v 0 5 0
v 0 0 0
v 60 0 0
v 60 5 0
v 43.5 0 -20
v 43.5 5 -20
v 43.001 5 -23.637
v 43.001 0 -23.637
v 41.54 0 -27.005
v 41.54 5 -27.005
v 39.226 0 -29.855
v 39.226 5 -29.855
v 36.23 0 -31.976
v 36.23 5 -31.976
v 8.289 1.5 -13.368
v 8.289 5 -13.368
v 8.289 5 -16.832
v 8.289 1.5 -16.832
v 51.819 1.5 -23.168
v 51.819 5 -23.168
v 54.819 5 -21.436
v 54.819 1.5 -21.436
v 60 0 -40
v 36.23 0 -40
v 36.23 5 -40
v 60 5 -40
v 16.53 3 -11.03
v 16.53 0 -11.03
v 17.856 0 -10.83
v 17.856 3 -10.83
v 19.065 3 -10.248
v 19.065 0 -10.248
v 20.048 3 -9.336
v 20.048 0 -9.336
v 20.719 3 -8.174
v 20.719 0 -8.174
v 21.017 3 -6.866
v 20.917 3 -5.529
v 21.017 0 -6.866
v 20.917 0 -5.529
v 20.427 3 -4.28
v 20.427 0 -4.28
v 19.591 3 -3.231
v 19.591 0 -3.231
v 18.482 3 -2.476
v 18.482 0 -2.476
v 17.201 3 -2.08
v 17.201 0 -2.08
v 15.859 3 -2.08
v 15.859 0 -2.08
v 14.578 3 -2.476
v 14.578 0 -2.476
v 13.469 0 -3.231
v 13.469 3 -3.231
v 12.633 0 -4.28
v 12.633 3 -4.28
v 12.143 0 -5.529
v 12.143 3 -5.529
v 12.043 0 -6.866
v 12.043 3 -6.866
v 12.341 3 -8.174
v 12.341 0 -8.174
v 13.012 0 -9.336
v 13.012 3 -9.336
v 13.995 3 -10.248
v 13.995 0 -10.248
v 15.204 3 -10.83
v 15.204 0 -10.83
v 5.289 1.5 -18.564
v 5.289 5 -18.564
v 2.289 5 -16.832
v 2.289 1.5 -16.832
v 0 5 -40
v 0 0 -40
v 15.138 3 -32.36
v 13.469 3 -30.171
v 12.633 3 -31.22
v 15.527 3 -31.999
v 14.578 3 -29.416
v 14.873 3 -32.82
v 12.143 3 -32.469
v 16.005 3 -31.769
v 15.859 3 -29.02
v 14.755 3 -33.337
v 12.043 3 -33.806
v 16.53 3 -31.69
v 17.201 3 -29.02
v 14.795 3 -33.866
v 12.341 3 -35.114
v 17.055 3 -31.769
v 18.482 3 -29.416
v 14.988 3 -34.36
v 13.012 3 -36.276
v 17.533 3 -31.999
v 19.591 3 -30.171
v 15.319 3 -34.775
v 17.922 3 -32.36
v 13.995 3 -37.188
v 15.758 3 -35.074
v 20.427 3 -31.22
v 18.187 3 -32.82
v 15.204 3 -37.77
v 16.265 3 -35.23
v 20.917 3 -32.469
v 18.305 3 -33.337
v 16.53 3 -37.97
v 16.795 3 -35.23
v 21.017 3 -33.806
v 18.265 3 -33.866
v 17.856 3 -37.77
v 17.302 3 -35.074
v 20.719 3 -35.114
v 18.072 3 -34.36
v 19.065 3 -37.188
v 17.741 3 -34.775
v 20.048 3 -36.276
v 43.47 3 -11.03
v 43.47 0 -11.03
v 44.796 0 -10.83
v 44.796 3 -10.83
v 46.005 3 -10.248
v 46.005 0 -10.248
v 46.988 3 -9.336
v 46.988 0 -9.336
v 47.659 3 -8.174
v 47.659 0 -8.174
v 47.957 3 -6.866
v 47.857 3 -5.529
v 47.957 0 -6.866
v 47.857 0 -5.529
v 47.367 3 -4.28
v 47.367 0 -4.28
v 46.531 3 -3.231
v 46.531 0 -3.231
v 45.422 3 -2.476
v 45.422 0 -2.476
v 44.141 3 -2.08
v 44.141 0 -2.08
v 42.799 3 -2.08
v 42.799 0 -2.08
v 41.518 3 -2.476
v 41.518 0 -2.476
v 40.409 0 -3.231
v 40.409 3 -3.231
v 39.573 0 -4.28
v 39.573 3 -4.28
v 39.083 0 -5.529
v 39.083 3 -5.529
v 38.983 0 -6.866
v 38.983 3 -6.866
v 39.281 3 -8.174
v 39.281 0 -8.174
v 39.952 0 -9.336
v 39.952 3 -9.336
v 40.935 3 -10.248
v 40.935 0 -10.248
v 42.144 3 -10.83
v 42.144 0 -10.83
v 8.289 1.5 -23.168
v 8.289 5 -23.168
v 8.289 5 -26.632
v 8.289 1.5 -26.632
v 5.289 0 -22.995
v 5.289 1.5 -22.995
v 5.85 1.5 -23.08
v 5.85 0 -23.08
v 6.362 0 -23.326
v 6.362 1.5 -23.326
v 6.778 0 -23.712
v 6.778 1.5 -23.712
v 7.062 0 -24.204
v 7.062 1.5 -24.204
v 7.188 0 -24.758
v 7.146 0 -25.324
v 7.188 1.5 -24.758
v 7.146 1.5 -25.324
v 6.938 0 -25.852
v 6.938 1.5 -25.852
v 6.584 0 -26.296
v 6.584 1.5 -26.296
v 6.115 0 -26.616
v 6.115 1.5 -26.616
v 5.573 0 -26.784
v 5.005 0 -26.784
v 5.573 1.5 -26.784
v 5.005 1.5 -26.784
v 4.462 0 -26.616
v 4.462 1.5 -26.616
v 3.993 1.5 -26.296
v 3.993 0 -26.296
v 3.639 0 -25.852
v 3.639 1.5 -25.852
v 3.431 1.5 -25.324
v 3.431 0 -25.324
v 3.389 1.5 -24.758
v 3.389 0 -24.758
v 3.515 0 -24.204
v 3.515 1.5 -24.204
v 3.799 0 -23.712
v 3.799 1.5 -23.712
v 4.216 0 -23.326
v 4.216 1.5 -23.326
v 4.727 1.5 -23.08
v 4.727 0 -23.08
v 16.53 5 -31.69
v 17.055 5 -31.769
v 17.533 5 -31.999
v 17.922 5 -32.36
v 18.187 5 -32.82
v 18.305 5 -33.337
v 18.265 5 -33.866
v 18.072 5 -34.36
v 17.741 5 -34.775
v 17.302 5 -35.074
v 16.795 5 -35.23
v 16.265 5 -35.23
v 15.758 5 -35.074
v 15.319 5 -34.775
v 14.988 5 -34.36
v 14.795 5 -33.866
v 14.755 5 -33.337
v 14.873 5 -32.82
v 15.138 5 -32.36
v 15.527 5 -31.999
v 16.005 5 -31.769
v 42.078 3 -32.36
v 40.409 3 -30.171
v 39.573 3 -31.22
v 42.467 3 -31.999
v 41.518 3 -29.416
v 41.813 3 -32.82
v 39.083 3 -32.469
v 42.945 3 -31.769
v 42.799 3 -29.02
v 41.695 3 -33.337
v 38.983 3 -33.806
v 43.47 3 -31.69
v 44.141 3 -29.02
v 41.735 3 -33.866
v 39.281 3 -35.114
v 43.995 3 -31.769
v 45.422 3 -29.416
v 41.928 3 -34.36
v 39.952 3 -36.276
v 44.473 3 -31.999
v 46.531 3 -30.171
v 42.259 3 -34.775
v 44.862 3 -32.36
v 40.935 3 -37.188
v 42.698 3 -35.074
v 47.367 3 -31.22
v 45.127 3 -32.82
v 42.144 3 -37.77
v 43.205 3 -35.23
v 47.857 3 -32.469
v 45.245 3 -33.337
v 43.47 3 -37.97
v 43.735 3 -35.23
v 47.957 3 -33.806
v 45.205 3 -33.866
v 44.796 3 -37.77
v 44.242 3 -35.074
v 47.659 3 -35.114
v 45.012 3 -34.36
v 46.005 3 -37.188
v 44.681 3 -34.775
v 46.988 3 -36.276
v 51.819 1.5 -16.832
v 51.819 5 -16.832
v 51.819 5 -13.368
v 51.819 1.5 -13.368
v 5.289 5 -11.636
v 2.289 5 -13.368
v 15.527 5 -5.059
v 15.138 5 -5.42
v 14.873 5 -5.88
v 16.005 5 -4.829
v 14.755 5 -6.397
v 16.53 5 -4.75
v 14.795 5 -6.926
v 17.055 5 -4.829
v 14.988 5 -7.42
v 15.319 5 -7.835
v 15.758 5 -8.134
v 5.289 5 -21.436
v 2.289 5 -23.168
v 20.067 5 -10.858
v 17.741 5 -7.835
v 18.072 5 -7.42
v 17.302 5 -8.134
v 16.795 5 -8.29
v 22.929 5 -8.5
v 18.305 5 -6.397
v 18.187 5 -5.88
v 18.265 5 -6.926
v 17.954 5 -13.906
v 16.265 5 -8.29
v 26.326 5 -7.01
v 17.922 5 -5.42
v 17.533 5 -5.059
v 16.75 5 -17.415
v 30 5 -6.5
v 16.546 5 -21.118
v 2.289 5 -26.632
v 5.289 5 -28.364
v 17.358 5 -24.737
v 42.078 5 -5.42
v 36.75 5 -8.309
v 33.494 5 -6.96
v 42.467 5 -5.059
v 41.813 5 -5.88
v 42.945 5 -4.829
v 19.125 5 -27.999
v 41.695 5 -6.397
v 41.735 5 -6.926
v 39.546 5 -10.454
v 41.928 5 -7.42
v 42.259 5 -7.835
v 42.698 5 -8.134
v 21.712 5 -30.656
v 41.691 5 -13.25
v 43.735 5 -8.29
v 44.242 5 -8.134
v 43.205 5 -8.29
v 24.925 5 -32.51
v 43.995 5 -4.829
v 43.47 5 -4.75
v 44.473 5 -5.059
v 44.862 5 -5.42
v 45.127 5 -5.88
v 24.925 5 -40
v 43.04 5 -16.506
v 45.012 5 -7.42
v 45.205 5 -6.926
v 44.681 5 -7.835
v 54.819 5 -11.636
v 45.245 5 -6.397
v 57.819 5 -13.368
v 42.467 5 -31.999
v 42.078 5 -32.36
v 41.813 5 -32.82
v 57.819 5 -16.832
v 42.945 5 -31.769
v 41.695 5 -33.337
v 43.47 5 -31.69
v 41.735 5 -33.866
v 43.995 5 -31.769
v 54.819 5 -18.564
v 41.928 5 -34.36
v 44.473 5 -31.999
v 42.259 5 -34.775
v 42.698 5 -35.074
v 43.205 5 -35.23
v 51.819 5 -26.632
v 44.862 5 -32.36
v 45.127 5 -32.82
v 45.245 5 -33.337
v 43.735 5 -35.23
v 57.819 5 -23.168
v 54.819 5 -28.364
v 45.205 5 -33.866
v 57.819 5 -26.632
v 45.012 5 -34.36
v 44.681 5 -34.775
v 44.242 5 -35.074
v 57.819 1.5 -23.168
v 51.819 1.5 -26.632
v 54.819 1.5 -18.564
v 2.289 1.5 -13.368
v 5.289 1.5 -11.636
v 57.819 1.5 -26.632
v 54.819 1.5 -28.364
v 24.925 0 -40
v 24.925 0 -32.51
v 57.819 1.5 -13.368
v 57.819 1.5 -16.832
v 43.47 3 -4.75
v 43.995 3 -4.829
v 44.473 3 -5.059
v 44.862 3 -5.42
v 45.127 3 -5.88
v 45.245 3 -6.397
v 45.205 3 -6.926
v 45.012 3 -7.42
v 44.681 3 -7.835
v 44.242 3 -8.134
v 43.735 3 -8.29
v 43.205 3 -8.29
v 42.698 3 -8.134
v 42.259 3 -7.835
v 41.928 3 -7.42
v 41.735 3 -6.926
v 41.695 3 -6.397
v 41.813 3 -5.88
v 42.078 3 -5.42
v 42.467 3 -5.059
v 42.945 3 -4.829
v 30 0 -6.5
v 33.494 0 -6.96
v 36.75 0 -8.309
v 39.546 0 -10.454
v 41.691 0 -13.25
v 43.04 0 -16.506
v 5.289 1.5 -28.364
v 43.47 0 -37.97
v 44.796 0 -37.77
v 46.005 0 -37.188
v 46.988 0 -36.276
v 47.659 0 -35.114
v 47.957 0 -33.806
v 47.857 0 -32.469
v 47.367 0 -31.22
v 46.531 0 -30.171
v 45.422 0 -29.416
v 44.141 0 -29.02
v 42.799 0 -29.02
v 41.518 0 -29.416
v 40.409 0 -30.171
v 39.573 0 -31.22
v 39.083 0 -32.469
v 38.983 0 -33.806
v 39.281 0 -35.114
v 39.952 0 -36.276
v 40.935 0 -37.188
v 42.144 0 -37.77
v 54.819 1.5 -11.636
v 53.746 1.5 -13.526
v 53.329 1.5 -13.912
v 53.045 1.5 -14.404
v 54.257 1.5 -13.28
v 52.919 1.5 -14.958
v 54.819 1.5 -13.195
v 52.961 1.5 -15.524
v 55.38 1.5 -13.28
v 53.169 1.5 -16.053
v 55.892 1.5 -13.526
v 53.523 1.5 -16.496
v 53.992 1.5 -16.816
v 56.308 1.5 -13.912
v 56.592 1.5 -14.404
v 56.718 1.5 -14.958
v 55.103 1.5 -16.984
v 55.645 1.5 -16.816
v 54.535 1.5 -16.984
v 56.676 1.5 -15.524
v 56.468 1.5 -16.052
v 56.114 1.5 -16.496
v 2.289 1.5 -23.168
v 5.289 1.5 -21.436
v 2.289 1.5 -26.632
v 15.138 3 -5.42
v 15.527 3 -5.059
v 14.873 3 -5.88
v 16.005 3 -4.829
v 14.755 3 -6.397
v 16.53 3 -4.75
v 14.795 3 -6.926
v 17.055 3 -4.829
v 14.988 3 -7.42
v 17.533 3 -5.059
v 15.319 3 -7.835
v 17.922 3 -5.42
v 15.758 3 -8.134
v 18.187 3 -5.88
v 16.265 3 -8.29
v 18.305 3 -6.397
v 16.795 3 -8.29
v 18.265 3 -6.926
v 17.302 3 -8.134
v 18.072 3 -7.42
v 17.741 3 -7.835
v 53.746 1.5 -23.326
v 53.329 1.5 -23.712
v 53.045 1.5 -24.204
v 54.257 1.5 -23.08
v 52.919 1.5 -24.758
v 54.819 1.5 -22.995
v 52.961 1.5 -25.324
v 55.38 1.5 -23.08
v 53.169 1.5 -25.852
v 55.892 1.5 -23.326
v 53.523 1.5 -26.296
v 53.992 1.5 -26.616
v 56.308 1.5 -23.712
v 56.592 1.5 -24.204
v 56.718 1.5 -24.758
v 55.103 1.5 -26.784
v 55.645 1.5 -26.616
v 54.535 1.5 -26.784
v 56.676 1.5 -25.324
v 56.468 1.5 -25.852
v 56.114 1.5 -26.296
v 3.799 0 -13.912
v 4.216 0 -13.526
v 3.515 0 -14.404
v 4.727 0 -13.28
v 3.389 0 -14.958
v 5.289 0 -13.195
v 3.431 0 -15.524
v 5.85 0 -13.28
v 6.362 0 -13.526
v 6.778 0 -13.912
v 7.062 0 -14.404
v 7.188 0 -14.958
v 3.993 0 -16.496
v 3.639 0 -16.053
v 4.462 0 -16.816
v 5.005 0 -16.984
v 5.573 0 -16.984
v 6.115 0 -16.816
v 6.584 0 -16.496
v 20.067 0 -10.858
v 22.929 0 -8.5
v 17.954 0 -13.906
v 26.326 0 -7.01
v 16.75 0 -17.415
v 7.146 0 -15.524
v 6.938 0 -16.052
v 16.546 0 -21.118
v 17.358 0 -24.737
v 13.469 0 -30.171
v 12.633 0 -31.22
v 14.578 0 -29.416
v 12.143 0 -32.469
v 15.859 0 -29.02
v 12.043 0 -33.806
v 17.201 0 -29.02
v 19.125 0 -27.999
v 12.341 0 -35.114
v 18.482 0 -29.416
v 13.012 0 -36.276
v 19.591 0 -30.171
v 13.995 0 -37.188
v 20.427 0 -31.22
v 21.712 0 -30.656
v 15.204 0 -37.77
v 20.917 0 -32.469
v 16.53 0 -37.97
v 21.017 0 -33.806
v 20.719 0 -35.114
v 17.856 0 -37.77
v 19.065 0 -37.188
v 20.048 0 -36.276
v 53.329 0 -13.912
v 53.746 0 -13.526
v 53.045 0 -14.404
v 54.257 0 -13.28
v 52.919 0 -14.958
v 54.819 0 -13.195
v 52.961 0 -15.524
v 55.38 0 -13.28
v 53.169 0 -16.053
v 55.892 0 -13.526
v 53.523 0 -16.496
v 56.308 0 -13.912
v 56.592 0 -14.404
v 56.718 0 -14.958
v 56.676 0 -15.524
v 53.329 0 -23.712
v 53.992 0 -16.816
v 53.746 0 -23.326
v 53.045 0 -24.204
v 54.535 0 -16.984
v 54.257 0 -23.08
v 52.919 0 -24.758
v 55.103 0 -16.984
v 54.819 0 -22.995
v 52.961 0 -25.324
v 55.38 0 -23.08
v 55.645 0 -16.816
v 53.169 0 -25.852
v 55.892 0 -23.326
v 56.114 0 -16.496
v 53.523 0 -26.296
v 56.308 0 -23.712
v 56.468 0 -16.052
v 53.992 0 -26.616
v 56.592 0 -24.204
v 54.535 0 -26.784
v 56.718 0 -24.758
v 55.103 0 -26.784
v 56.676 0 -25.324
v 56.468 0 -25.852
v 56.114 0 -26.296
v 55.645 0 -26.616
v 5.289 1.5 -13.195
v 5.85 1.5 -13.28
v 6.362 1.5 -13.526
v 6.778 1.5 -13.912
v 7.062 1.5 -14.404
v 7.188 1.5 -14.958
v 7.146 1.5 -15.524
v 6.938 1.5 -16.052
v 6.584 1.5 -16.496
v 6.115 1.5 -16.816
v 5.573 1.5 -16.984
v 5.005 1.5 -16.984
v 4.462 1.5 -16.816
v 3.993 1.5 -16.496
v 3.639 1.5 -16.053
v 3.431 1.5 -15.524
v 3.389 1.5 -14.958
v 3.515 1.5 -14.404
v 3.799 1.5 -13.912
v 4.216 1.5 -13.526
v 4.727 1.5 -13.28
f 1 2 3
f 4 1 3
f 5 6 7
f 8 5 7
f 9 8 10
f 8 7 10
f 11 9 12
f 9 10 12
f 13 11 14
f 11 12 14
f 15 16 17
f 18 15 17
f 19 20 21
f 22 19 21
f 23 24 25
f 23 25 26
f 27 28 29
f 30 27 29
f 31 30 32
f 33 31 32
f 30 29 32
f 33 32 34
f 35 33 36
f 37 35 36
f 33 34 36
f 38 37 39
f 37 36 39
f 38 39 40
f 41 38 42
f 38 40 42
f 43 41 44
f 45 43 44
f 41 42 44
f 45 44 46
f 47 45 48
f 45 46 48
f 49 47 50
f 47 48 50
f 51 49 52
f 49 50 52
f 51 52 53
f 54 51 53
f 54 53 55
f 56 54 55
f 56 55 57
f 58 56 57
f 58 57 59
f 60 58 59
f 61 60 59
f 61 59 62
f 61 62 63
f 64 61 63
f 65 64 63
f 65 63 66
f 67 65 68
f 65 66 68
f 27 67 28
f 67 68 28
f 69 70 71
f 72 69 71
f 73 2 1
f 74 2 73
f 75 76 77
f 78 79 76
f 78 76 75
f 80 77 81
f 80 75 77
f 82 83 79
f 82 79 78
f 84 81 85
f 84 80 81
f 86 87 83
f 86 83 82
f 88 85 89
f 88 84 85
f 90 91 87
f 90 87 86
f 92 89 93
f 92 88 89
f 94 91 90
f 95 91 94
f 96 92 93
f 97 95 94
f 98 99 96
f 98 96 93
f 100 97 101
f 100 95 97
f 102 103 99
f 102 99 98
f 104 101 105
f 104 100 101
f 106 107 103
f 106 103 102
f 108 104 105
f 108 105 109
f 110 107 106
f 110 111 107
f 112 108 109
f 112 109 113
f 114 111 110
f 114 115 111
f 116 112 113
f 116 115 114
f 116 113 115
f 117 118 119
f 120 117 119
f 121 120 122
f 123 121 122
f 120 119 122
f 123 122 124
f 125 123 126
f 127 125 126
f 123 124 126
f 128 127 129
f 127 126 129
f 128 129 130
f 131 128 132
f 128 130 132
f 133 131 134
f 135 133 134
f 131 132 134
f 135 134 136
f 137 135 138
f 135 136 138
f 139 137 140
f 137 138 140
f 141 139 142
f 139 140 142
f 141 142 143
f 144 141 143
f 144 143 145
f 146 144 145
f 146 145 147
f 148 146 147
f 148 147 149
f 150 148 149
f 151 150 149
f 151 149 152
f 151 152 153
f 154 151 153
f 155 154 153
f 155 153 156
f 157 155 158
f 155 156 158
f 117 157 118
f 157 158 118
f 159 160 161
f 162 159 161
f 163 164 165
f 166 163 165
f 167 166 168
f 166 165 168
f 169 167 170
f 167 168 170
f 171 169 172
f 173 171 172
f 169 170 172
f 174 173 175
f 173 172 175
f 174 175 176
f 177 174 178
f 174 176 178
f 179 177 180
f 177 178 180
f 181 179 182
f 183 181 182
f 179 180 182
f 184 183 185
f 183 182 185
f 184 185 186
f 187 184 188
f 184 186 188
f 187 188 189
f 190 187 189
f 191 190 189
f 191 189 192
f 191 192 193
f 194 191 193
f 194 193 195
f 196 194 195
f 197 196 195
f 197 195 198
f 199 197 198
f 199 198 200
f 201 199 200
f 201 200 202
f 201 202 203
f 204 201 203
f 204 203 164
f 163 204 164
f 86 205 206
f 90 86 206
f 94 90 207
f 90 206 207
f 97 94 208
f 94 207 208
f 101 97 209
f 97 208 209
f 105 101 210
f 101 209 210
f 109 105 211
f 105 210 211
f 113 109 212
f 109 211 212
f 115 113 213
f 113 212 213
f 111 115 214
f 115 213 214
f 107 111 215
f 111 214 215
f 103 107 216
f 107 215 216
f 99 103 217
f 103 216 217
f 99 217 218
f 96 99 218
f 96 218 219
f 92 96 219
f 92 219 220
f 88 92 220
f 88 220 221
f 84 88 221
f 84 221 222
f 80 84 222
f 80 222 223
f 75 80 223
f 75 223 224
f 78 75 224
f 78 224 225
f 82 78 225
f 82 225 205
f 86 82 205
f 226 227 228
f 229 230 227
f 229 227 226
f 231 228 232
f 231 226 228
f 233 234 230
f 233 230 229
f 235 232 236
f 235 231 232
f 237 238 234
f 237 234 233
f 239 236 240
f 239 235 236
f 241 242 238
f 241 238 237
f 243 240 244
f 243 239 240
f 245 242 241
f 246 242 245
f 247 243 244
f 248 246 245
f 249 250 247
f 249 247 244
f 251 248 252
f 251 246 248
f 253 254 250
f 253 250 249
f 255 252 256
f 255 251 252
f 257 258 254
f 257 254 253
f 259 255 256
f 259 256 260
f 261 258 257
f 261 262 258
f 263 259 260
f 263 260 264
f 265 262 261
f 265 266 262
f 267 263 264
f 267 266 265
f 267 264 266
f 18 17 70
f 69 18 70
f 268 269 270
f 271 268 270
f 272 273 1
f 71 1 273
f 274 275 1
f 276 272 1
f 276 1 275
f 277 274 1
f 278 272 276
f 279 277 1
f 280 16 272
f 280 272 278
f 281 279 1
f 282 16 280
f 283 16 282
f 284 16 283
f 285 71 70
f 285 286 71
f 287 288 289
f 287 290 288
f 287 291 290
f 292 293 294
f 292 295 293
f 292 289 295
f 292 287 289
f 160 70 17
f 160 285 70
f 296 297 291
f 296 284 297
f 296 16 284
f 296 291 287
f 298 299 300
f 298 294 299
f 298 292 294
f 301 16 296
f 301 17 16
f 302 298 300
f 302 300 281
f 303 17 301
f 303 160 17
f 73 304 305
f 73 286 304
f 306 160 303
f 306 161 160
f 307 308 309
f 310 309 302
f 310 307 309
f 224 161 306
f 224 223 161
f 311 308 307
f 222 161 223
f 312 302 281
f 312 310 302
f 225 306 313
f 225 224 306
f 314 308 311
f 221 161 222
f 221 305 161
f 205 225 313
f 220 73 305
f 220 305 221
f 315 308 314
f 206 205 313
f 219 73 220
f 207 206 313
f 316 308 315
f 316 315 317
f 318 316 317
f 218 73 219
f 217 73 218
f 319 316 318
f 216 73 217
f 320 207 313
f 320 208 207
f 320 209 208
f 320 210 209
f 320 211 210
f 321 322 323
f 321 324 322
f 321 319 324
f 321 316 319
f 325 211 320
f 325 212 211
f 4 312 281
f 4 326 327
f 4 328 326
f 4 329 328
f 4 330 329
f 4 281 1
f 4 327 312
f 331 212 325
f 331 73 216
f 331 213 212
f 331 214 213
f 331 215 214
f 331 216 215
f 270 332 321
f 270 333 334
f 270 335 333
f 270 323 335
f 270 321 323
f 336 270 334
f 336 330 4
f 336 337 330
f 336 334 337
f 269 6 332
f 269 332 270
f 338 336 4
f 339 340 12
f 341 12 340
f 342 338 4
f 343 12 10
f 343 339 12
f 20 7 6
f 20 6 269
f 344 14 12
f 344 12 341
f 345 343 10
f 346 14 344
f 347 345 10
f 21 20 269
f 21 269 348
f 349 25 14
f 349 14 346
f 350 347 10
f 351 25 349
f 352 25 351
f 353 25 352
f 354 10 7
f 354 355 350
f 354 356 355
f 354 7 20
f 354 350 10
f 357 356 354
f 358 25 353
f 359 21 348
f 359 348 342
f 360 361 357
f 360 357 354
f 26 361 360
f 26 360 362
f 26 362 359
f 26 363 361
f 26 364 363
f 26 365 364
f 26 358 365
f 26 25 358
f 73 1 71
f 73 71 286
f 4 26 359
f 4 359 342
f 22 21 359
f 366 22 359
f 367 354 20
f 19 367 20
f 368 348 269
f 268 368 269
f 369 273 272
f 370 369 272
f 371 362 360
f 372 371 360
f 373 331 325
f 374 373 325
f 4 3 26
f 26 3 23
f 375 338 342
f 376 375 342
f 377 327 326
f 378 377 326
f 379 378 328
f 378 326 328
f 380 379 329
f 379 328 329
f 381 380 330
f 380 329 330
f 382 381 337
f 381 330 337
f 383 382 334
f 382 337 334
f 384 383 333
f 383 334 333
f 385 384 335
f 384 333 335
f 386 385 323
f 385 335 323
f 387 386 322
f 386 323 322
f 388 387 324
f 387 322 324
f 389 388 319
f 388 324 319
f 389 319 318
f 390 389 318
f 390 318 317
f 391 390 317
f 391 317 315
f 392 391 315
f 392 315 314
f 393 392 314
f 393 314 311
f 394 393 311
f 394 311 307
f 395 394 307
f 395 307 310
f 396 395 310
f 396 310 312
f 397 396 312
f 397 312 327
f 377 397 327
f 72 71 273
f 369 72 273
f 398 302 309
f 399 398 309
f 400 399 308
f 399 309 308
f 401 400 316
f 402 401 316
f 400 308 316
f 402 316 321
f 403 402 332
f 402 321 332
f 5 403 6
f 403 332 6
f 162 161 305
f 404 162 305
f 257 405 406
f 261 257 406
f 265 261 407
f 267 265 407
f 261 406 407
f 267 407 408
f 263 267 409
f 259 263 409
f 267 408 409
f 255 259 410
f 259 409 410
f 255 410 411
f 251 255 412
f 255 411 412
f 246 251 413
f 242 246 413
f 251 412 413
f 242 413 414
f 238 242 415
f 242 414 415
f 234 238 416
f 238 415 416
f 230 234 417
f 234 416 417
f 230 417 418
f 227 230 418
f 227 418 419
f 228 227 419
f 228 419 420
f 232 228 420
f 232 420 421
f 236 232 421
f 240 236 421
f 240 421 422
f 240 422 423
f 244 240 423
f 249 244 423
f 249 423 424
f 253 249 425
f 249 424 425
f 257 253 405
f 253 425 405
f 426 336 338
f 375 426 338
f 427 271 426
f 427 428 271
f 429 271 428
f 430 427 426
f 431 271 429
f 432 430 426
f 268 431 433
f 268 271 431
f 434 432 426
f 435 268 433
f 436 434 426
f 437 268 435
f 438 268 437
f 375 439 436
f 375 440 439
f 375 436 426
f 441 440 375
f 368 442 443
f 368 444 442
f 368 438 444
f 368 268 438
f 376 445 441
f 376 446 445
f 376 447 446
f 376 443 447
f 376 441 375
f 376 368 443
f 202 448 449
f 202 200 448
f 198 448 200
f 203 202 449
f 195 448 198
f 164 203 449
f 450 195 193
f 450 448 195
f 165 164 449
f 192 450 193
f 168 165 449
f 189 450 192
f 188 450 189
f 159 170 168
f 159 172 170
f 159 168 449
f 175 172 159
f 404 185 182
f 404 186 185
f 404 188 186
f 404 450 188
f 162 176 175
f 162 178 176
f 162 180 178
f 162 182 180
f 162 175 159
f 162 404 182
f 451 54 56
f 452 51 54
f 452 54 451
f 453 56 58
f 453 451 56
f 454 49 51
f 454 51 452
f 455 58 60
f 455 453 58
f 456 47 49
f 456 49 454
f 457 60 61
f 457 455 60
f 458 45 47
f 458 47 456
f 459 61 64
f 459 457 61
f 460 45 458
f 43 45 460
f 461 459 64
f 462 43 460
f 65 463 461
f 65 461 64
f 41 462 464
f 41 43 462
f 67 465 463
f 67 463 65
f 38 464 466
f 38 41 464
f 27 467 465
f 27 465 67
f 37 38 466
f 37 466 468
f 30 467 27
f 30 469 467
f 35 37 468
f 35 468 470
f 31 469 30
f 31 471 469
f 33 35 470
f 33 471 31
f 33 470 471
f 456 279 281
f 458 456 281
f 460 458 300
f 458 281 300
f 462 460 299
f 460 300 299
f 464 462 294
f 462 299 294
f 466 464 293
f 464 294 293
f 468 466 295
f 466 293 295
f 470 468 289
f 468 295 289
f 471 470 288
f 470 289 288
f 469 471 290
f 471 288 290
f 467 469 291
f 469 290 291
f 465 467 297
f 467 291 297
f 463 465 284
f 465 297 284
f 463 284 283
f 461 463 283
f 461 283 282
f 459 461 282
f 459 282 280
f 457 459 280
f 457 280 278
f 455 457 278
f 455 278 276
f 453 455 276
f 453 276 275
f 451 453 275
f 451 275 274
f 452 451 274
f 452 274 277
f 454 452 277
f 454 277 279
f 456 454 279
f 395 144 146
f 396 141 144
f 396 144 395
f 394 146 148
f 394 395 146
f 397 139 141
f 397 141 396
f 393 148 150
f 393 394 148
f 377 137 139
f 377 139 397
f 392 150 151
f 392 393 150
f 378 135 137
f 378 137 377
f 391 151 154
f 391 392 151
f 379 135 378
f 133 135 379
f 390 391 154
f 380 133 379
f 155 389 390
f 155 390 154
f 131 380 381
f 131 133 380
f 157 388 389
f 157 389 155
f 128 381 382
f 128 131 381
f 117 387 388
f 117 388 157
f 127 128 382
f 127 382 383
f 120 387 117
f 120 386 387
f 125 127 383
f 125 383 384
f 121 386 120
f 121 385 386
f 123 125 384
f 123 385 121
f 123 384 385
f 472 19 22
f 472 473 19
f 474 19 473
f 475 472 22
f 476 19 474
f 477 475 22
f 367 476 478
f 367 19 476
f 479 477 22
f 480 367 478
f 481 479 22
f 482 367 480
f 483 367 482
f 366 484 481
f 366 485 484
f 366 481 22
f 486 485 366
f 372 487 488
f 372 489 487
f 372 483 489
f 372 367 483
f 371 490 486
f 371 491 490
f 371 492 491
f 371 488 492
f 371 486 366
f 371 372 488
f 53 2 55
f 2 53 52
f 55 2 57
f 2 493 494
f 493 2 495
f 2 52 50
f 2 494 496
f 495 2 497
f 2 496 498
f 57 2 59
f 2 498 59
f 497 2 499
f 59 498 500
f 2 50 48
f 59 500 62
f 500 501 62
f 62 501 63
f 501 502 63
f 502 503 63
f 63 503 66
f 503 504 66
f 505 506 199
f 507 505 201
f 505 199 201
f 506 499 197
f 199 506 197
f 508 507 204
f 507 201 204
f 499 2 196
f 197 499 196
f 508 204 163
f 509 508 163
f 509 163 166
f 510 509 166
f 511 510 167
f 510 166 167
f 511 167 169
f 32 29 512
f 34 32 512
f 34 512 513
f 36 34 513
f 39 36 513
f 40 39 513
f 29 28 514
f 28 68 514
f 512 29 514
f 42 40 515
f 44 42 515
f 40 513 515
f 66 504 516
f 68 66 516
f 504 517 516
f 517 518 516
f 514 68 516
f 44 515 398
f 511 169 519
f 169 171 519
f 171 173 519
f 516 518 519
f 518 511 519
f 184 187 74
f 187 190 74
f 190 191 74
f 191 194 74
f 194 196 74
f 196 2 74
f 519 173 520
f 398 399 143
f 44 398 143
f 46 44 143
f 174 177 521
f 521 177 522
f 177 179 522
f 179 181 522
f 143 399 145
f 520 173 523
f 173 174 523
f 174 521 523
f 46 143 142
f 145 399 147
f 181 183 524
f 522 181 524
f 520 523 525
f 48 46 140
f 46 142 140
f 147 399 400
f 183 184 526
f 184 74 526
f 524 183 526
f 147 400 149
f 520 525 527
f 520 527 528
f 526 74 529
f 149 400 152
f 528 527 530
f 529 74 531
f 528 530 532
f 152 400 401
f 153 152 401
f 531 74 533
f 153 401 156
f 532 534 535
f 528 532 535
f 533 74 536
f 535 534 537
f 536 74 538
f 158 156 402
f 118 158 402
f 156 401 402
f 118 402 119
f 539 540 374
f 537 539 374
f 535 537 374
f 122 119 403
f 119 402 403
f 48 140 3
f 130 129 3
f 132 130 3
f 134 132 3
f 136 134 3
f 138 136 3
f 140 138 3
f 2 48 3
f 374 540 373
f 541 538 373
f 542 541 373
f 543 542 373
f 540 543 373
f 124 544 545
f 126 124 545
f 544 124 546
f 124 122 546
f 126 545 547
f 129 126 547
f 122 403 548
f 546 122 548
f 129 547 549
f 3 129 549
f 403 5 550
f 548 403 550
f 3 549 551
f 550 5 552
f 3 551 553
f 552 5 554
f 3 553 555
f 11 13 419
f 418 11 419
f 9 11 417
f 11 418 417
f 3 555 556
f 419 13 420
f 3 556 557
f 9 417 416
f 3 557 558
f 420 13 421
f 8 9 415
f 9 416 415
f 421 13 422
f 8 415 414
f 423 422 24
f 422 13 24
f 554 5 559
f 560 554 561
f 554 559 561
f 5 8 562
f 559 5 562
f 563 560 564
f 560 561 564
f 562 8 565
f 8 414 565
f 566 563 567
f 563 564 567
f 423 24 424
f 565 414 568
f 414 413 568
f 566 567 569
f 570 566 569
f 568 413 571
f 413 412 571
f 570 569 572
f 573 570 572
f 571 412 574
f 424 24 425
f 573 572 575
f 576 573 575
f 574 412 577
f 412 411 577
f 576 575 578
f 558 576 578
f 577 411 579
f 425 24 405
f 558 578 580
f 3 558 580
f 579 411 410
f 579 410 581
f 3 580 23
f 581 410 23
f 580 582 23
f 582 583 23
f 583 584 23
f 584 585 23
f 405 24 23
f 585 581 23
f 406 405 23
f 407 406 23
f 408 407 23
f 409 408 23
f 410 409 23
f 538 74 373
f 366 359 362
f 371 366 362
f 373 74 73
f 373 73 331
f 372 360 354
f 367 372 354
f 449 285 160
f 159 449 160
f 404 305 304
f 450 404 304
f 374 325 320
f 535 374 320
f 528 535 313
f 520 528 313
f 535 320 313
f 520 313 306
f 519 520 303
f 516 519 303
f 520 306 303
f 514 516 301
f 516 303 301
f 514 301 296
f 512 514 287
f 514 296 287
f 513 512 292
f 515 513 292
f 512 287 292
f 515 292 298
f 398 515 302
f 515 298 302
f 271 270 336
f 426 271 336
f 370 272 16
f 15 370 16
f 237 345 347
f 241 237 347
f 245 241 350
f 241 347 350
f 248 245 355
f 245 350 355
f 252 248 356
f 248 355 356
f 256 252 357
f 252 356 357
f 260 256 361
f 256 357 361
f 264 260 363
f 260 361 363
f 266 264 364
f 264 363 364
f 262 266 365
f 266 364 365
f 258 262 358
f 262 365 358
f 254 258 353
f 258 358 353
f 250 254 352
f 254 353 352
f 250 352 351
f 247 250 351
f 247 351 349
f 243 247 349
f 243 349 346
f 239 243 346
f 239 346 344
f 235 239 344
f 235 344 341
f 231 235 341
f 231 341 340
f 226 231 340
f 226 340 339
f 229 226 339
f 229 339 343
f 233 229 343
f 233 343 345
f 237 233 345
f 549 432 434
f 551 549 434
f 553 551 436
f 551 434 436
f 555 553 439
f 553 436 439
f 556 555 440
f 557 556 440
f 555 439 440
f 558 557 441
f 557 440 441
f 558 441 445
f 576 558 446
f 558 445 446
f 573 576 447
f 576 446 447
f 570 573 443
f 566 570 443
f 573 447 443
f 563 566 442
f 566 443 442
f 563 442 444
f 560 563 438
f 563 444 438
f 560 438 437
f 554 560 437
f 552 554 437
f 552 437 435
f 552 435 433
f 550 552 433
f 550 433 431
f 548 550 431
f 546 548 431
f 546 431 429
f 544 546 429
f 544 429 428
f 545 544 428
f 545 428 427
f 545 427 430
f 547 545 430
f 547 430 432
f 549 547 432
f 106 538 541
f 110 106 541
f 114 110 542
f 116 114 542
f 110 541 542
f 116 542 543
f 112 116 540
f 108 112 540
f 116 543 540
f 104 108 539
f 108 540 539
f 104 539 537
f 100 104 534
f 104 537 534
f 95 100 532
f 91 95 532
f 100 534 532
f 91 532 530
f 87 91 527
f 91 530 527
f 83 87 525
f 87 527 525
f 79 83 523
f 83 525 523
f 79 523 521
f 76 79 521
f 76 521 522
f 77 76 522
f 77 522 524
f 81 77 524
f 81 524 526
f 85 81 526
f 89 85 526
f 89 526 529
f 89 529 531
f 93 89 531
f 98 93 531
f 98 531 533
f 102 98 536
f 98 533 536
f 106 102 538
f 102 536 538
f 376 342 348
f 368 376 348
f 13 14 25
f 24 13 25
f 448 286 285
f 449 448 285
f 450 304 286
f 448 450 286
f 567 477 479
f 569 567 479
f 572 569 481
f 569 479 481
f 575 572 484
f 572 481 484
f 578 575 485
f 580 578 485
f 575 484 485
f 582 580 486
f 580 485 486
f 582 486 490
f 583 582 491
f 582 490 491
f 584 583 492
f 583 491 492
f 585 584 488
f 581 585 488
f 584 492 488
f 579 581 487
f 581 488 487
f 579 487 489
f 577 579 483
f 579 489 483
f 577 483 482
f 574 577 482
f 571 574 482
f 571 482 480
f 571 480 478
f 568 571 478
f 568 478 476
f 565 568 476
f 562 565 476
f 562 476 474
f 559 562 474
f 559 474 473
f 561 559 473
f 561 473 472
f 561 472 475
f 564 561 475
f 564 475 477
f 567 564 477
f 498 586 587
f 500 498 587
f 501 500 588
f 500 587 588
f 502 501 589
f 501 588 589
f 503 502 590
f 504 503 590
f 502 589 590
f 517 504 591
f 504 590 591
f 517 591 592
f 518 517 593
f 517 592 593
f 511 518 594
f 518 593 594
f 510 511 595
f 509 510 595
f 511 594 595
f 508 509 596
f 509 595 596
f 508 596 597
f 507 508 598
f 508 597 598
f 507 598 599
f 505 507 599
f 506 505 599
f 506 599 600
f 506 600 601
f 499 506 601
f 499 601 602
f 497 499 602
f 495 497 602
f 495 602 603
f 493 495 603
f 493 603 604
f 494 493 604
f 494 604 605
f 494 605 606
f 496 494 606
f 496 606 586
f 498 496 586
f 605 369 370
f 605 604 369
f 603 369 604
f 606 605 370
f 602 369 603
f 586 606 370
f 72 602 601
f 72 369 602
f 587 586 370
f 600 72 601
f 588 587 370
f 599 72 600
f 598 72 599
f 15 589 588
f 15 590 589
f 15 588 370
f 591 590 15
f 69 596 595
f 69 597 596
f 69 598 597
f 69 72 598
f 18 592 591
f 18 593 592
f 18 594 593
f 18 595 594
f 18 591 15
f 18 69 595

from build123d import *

# Parameters (mm, degrees)
SKETCH1_W           = 60
SKETCH1_H           = 40
BOSS_EXTRUDE1_DEPTH = 5
SKETCH2_R           = 1.78
SKETCH2_R_2         = 1.905
CUT_EXTRUDE1_DEPTH  = 10
CUT_EXTRUDE2_DEPTH  = 73.284161474
SKETCH7_R           = 4.5
CUT_EXTRUDE5_DEPTH  = 3
CUT_EXTRUDE6_DEPTH  = 3.5


with BuildPart() as part:
    # Sketch1 → Boss-Extrude1 (new body)
    with BuildSketch(Plane(origin=(0, 0, 0), x_dir=(1, 0, 0), z_dir=(0, 1, 0))):
        with Locations((30, 20)):
            Rectangle(SKETCH1_W, SKETCH1_H)
    extrude(amount=BOSS_EXTRUDE1_DEPTH)

    # Sketch2 → Cut-Extrude1 (cut)
    with BuildSketch(Plane(origin=(0, 5, 0), x_dir=(1, 0, 0), z_dir=(0, 1, 0))):
        with Locations(Location((43.47, 33.47, 0), (0, 0, 270))):
            Circle(SKETCH2_R)
        with Locations(Location((16.53, 33.47, 0), (0, 0, 270))):
            Circle(SKETCH2_R)
        with Locations(Location((16.53, 6.53, 0), (0, 0, 270))):
            Circle(SKETCH2_R)
        with Locations(Location((43.47, 6.53, 0), (0, 0, 270))):
            Circle(SKETCH2_R)
        with Locations(Location((54.818710608, 24.9, 0), (0, 0, 270))):
            Circle(SKETCH2_R_2)
        with Locations(Location((5.288710608, 24.9, 0), (0, 0, 270))):
            Circle(SKETCH2_R_2)
        with Locations(Location((5.288710608, 15.1, 0), (0, 0, 270))):
            Circle(SKETCH2_R_2)
        with Locations(Location((54.818710608, 15.1, 0), (0, 0, 270))):
            Circle(SKETCH2_R_2)
    extrude(amount=-CUT_EXTRUDE1_DEPTH, mode=Mode.SUBTRACT)

    # Sketch3 → Cut-Extrude2 (cut, through all)
    with BuildSketch(Plane(origin=(0, 5, 0), x_dir=(1, 0, 0), z_dir=(0, 1, 0))):
        with BuildLine():
            ThreePointArc((36.230094697, 31.976473607), (33.206836939, 33.113588252), (30, 33.5))
            Line((30, 33.5), (30, 27.34780867))
            Line((30, 27.34780867), (36.230094697, 27.34780867))
            Line((36.230094697, 27.34780867), (36.230094697, 31.976473607))
        make_face()
        with BuildLine():
            Line((36.230094697, 27.34780867), (30, 27.34780867))
            Line((30, 27.34780867), (30, 6.5))
            ThreePointArc((30, 6.5), (39.545941546, 10.454058454), (43.5, 20))
            ThreePointArc((43.5, 20), (41.540283324, 27.005131033), (36.230094697, 31.976473607))
            Line((36.230094697, 31.976473607), (36.230094697, 27.34780867))
        make_face()
        with BuildLine():
            Line((30, 27.34780867), (30, 33.5))
            ThreePointArc((30, 33.5), (27.414652789, 33.250131312), (24.925008883, 32.509774785))
            Line((24.925008883, 32.509774785), (24.925008883, 27.34780867))
            Line((24.925008883, 27.34780867), (30, 27.34780867))
        make_face()
        with BuildLine():
            Line((30, 6.5), (30, 27.34780867))
            Line((30, 27.34780867), (24.925008883, 27.34780867))
            Line((24.925008883, 27.34780867), (24.925008883, 32.509774785))
            ThreePointArc((24.925008883, 32.509774785), (16.749868688, 17.414652789), (30, 6.5))
        make_face()
        with BuildLine():
            Line((36.230094697, 40), (30, 40))
            Line((30, 40), (30, 33.5))
            ThreePointArc((30, 33.5), (33.206836939, 33.113588252), (36.230094697, 31.976473607))
            Line((36.230094697, 31.976473607), (36.230094697, 40))
        make_face()
        with BuildLine():
            Line((30, 33.5), (30, 40))
            Line((30, 40), (24.925008883, 40))
            Line((24.925008883, 40), (24.925008883, 32.509774785))
            ThreePointArc((24.925008883, 32.509774785), (27.414652789, 33.250131312), (30, 33.5))
        make_face()
    extrude(amount=-CUT_EXTRUDE2_DEPTH, mode=Mode.SUBTRACT)

    # Sketch7 → Cut-Extrude5 (cut)
    with BuildSketch(Plane(origin=(0, 0, 0), x_dir=(-1, 0, 0), z_dir=(0, -1, 0))):
        with Locations(Location((-43.47, 6.53, 0), (0, 0, 90))):
            Circle(SKETCH7_R)
        with Locations(Location((-16.53, 6.53, 0), (0, 0, 90))):
            Circle(SKETCH7_R)
        with Locations(Location((-16.53, 33.47, 0), (0, 0, 90))):
            Circle(SKETCH7_R)
        with Locations(Location((-43.47, 33.47, 0), (0, 0, 90))):
            Circle(SKETCH7_R)
    extrude(amount=-CUT_EXTRUDE5_DEPTH, mode=Mode.SUBTRACT)

    # Sketch8 → Cut-Extrude6 (cut)
    with BuildSketch(Plane(origin=(0, 5, 0), x_dir=(1, 0, 0), z_dir=(0, 1, 0))):
        Polygon((5.288710608, 18.564101615), (2.288710608, 16.832050808), (2.288710608, 13.367949192), (5.288710608, 11.635898385), (8.288710608, 13.367949192), (8.288710608, 16.832050808), align=None)
        Polygon((54.818710608, 11.635898385), (57.818710608, 13.367949192), (57.818710608, 16.832050808), (54.818710608, 18.564101615), (51.818710608, 16.832050808), (51.818710608, 13.367949192), align=None)
        Polygon((5.288710608, 28.364101615), (2.288710608, 26.632050808), (2.288710608, 23.167949192), (5.288710608, 21.435898385), (8.288710608, 23.167949192), (8.288710608, 26.632050808), align=None)
        Polygon((54.818710608, 28.364101615), (51.818710608, 26.632050808), (51.818710608, 23.167949192), (54.818710608, 21.435898385), (57.818710608, 23.167949192), (57.818710608, 26.632050808), align=None)
    extrude(amount=-CUT_EXTRUDE6_DEPTH, mode=Mode.SUBTRACT)


solid = part.part
